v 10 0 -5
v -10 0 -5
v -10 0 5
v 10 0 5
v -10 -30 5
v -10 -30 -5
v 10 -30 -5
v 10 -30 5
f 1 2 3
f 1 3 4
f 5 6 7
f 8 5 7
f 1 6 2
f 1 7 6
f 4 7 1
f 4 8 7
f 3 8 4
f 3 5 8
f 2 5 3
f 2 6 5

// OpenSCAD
/*
color("red")
    translate([0, -30, 0])
        linear_extrude(height = 30)
            square([20, 10], center = true);

// using the scale parameter a frustum can be constructed
color("green")
    translate([-30, 0, 0])
        linear_extrude(height = 20, scale = 0.2)
            square([20, 10], center = true);

// with twist the extruded shape will rotate around the Z axis
color("cyan")
    translate([30, 0, 0])
        linear_extrude(height = 20, twist = 90)
            square([20, 10], center = true);

// combining both relatively complex shapes can be created
color("gray")
    translate([0, 30, 0])
        linear_extrude(height = 40, twist = -360, scale = 0, center = true, slices = 200)
            square([20, 10], center = true);
*/

// rectangular body
color("black")
    rotate([90, 0, 0])
    translate([0, 0, 0])
        linear_extrude(height = 30)
            square([20, 10], center = true);

// len = 30 made it 100
// height is weird
